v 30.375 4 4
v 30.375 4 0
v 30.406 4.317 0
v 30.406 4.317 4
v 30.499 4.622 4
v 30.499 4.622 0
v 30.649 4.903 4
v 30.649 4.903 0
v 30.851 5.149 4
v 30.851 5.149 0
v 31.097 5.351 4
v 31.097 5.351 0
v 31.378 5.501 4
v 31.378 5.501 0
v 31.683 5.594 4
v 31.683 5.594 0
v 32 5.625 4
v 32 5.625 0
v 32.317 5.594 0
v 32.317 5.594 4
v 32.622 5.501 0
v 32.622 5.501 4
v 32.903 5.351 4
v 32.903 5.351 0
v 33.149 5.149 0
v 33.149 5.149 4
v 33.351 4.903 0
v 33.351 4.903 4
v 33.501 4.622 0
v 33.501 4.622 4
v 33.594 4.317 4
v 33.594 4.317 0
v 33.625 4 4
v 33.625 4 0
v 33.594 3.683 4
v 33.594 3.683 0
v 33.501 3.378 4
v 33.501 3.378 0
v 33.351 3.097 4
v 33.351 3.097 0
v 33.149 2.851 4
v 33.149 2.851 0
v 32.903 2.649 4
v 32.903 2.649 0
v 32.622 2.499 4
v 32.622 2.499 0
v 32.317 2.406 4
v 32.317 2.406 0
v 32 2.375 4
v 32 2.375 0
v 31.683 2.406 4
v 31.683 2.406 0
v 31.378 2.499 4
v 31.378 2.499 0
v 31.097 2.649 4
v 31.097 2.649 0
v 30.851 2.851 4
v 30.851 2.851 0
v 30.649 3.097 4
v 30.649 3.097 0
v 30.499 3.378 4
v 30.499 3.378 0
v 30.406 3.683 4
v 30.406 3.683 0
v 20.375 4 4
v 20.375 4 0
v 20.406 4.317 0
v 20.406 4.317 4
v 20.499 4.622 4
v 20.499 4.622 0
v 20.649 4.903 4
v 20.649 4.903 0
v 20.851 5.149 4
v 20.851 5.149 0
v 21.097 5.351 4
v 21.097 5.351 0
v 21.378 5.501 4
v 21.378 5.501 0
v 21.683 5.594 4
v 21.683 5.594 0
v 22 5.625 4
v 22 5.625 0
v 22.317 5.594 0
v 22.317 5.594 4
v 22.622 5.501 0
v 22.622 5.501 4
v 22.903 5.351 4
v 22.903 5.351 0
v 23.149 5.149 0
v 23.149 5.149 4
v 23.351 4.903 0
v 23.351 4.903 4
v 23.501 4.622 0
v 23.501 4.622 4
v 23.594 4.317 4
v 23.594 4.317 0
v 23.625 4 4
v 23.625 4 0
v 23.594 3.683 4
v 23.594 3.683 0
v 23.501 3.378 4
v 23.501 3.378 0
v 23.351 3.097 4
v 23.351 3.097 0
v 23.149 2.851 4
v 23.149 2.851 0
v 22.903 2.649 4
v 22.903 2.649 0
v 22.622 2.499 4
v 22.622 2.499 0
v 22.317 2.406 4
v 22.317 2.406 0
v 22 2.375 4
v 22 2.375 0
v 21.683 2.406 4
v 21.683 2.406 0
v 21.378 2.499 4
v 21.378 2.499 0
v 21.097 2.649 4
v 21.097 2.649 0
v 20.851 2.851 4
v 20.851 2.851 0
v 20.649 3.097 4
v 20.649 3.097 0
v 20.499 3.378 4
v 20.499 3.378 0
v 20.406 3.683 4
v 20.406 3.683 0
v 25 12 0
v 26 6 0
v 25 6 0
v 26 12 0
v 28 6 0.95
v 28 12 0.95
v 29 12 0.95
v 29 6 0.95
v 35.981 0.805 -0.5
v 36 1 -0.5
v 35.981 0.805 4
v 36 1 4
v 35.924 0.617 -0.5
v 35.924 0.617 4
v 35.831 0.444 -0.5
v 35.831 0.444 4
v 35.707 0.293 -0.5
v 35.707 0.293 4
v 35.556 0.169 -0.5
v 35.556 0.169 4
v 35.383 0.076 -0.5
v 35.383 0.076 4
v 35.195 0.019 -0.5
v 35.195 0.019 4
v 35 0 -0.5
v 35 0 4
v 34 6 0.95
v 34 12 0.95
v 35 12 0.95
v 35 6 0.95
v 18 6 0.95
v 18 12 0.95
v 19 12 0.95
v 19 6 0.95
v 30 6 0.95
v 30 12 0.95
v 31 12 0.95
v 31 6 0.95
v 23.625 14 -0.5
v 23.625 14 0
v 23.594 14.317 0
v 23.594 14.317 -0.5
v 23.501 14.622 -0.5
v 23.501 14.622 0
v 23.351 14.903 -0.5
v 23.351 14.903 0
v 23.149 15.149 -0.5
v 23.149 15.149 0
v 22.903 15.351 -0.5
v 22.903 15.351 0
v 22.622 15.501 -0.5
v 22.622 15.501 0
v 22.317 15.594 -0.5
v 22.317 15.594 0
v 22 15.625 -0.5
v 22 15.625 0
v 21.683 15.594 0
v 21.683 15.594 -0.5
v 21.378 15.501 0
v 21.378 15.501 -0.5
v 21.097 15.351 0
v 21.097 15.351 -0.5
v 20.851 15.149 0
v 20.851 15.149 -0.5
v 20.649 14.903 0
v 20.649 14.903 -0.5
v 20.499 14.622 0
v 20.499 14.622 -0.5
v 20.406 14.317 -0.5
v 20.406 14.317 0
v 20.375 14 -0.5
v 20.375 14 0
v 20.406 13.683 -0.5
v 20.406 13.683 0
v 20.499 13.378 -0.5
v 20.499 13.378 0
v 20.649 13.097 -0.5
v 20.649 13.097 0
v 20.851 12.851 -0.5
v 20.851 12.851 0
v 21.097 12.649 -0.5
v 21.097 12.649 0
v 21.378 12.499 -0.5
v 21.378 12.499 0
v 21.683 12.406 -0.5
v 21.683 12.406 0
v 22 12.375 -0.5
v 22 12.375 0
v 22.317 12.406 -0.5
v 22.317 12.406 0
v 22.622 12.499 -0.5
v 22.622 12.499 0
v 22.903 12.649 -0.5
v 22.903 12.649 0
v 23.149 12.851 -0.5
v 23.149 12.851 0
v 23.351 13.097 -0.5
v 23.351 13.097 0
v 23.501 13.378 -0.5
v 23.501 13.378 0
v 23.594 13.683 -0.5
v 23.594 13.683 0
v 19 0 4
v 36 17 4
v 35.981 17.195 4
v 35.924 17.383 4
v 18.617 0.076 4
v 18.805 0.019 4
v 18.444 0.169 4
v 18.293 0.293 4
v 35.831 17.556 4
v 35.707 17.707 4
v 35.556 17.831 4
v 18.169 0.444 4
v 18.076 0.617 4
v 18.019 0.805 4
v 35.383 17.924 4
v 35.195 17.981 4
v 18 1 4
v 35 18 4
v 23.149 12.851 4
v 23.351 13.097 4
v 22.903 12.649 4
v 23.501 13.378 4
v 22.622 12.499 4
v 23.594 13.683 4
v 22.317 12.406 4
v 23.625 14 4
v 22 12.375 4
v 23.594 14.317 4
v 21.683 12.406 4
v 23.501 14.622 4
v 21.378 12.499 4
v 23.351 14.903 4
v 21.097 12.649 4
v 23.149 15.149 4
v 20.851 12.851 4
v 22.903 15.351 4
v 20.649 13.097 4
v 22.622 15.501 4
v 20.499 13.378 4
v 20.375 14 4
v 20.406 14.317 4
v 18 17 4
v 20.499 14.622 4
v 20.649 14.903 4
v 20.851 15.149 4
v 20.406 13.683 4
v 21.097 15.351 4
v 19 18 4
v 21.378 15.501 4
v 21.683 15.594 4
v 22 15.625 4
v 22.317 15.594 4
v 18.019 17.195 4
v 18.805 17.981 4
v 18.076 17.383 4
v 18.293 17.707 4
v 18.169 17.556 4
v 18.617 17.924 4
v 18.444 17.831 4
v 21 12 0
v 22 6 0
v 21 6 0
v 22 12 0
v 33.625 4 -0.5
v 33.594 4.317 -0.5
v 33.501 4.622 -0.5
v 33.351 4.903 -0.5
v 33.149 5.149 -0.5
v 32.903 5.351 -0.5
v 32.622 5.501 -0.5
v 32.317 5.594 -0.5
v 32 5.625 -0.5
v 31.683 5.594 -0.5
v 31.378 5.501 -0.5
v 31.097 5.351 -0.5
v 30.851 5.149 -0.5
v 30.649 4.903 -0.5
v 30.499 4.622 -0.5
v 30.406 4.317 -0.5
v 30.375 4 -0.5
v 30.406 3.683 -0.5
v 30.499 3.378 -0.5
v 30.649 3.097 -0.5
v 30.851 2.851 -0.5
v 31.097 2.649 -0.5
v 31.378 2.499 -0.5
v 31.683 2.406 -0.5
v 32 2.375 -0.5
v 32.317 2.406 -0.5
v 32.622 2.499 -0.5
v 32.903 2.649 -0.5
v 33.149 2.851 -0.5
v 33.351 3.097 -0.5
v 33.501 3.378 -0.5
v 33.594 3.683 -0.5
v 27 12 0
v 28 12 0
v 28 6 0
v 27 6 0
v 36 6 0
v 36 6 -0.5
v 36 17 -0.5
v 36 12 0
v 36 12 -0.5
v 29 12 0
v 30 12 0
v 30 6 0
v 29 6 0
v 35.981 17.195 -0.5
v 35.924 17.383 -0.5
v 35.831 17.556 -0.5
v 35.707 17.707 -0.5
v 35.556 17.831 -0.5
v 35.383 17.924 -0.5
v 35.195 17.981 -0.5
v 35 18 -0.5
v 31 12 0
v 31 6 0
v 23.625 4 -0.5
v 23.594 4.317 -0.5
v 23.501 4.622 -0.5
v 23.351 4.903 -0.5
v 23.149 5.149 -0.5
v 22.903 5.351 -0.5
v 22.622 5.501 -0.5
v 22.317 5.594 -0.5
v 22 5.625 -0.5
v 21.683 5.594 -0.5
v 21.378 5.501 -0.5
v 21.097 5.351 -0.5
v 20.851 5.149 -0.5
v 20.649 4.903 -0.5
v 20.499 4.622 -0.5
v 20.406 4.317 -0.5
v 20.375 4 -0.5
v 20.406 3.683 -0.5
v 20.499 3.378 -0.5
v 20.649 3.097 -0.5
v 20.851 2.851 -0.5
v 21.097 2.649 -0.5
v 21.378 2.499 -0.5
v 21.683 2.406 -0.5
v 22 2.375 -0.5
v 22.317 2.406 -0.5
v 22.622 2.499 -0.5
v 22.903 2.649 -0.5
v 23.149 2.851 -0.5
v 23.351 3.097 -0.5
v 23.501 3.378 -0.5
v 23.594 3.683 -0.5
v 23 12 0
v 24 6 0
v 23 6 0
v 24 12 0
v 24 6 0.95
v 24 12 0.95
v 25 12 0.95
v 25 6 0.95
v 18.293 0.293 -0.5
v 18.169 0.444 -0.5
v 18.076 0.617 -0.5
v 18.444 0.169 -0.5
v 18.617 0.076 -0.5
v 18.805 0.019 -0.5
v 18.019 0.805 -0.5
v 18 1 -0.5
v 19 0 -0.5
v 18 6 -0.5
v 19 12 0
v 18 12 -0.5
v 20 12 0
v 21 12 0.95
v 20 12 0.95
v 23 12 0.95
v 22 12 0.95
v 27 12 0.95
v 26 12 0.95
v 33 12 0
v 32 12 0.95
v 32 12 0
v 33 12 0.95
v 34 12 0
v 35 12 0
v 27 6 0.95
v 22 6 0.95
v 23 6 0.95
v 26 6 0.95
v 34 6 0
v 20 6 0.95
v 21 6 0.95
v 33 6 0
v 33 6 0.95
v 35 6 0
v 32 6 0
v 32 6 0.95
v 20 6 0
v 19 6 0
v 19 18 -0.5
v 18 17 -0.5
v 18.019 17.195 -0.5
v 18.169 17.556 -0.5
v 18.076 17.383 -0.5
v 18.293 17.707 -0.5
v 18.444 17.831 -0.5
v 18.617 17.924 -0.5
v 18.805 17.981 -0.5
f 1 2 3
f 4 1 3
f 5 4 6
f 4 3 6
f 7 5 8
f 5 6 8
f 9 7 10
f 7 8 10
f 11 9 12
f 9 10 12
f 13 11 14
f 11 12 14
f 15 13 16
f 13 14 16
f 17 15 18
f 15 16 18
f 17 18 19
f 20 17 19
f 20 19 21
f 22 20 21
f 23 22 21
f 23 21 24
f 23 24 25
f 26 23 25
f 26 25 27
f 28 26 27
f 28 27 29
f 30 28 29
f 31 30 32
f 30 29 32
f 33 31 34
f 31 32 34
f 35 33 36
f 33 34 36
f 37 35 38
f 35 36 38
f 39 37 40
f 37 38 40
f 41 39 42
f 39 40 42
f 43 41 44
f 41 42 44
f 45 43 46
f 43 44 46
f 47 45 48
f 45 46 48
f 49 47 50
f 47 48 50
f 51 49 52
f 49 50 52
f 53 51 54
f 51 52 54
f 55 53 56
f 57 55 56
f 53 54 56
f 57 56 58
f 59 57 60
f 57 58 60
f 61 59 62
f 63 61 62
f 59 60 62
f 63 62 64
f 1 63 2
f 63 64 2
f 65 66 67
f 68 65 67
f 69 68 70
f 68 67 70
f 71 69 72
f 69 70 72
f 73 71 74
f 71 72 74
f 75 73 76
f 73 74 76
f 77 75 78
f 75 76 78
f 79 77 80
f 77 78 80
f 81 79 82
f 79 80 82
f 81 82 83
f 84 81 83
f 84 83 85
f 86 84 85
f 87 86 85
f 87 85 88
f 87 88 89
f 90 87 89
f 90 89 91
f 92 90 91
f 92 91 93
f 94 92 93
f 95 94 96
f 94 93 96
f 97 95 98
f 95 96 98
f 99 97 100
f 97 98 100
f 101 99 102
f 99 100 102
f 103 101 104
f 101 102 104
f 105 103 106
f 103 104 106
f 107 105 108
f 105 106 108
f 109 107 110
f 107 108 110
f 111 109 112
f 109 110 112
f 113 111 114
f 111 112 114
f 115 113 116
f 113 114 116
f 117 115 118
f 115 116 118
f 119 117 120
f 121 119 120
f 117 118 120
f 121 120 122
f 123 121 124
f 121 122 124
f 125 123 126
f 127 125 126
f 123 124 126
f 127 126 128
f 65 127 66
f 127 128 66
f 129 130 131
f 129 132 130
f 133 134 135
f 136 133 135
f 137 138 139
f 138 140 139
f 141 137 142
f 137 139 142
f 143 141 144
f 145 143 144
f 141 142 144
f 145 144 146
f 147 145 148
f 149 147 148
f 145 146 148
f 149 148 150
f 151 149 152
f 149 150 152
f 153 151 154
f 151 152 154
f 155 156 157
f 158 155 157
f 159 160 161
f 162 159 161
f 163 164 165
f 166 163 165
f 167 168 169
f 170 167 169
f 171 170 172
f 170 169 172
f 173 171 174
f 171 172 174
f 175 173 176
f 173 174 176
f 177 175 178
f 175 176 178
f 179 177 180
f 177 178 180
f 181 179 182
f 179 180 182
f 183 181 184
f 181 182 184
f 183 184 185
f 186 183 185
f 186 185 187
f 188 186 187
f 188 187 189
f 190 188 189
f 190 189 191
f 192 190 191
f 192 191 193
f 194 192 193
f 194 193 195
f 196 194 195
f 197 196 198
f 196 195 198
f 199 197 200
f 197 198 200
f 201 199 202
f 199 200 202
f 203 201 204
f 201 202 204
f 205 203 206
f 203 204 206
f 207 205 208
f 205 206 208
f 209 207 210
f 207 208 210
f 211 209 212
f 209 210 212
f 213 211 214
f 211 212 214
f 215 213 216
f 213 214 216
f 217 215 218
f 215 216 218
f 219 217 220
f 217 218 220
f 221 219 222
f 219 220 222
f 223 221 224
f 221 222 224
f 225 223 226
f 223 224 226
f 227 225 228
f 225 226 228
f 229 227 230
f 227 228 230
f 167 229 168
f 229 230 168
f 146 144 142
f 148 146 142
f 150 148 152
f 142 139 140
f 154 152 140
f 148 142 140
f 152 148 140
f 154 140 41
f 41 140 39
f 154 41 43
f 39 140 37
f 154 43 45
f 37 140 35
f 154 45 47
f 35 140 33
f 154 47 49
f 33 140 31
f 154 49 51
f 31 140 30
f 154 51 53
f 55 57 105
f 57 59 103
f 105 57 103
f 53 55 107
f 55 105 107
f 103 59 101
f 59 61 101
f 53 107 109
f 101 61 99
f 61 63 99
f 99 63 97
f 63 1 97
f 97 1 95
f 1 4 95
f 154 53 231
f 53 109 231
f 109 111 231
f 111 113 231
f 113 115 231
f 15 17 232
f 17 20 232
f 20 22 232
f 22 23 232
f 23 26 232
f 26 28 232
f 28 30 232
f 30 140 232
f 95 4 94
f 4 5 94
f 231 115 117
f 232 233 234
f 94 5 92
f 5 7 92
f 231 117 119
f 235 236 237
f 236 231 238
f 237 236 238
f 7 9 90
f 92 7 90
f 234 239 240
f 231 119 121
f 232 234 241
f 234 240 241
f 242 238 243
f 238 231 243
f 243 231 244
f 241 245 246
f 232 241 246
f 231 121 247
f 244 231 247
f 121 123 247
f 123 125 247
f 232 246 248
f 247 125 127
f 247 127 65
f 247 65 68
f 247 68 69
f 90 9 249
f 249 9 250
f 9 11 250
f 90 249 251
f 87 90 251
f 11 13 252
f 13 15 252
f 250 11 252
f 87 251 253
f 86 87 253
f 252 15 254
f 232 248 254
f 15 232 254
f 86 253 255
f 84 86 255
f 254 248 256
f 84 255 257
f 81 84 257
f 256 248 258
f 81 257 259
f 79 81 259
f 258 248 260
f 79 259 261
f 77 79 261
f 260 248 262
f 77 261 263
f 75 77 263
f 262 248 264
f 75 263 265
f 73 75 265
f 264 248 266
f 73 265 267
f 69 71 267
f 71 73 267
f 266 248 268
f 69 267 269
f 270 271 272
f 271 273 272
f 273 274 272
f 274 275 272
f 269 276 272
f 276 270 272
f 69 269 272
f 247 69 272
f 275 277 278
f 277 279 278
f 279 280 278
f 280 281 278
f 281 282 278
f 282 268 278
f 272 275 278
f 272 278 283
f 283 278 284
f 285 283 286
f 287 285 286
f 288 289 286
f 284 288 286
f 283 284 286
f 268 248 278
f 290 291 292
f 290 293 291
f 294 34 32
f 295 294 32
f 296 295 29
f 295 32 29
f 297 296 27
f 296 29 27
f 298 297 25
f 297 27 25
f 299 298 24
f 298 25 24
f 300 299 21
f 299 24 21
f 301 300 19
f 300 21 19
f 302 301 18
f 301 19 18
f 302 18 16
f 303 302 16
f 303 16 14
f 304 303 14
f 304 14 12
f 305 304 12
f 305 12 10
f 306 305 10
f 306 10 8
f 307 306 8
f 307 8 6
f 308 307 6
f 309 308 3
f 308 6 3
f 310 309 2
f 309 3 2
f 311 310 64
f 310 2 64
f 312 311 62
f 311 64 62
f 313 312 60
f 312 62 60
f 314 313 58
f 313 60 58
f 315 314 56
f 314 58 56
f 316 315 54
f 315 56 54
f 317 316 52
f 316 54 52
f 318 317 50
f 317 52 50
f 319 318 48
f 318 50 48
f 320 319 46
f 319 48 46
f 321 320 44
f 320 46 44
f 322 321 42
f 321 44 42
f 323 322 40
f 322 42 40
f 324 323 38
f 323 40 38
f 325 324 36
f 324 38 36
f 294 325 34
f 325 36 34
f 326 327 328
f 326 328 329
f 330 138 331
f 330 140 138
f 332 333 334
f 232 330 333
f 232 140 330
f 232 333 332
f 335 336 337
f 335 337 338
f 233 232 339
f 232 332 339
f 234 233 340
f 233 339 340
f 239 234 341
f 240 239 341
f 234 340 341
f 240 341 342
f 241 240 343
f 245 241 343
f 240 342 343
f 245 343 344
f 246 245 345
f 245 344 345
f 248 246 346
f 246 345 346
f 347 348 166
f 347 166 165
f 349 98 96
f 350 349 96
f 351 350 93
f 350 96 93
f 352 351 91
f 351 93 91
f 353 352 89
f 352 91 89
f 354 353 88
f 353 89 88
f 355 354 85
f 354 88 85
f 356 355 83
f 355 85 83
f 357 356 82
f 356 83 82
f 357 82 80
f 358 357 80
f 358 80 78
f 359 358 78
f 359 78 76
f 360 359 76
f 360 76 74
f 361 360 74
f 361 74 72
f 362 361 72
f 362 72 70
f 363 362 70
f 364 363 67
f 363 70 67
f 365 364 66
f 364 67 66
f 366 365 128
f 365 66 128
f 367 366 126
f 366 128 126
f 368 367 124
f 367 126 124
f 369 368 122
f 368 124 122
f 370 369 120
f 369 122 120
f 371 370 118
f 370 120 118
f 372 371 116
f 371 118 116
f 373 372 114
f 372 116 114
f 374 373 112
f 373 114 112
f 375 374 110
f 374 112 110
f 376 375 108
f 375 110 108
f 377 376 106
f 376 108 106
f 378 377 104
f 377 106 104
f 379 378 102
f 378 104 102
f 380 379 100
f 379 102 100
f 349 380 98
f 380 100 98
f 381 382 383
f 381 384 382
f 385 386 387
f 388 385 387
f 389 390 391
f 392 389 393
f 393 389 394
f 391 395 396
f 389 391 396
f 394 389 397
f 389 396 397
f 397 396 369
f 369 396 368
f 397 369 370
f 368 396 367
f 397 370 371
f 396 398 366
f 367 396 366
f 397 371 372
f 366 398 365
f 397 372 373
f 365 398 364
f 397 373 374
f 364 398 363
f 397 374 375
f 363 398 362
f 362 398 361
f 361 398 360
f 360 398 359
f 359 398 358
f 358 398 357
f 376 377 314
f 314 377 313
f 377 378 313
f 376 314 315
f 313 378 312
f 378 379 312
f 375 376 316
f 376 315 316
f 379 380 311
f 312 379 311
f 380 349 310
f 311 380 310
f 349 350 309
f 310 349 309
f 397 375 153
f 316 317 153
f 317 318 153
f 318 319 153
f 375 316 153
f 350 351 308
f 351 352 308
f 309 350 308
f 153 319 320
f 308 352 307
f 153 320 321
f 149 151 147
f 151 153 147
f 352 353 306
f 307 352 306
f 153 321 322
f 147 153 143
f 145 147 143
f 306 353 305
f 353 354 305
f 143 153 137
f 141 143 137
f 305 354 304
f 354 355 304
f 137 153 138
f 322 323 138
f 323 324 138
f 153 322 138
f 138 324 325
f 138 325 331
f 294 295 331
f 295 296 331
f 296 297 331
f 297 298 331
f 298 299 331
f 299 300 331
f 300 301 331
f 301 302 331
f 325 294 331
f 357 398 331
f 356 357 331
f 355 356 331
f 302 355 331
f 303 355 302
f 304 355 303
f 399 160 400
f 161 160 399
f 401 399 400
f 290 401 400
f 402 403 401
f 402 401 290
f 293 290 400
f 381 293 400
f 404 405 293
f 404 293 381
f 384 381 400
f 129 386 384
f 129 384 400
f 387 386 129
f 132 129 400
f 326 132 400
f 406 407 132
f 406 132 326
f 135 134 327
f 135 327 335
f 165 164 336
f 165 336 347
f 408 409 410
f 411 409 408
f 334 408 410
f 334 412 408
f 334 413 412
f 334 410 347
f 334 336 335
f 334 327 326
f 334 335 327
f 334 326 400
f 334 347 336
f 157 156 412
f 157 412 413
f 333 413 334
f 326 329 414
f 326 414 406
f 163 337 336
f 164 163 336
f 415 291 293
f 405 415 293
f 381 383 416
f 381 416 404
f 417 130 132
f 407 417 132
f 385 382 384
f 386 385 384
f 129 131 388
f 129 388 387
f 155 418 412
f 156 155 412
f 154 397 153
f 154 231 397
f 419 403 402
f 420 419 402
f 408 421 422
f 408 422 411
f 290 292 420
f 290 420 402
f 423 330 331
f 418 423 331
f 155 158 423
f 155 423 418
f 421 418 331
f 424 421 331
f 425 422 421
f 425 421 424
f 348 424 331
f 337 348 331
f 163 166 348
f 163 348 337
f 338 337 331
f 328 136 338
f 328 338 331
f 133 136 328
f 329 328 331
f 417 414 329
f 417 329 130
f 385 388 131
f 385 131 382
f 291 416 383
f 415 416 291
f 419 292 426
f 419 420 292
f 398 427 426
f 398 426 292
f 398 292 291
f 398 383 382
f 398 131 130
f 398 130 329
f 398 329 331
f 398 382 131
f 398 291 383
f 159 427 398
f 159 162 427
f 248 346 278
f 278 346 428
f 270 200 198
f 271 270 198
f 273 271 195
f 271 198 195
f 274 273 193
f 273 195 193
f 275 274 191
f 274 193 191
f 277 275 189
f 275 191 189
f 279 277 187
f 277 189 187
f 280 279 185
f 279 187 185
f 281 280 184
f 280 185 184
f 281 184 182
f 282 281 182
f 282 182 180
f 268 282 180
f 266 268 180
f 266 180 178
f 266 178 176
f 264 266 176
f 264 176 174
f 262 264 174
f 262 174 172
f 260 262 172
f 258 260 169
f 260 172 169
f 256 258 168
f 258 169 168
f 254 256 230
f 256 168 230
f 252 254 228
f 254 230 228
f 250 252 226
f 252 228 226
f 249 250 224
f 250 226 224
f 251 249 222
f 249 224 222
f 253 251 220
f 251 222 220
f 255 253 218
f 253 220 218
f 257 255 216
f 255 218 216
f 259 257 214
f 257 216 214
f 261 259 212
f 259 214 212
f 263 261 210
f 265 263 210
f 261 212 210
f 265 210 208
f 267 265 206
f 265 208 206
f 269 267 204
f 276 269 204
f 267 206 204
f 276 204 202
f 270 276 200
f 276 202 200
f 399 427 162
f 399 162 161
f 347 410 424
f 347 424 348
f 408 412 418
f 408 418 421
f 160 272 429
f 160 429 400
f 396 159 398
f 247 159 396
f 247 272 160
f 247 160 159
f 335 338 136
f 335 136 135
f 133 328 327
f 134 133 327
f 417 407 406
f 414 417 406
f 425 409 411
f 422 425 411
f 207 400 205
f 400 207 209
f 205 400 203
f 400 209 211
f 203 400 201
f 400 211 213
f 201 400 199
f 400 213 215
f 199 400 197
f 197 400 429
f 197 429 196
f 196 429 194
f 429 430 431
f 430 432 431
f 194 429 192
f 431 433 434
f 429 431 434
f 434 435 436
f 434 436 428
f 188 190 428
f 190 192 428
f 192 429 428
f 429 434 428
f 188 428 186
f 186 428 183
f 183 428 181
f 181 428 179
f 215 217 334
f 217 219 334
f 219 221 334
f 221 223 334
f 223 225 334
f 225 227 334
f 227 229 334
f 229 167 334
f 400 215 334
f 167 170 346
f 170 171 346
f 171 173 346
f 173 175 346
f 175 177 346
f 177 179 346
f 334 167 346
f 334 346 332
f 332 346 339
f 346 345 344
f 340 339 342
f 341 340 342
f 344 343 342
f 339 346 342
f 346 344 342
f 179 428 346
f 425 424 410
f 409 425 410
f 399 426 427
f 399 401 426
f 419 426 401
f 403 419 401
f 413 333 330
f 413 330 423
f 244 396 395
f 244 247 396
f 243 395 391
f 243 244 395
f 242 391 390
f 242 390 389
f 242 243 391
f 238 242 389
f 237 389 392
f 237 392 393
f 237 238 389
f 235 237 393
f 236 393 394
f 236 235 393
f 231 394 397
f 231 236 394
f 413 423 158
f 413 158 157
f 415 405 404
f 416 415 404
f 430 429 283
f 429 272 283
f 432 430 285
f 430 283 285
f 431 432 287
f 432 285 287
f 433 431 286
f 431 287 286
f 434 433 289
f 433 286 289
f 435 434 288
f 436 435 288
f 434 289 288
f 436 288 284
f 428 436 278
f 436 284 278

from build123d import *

# Parameters (mm, degrees)
SKETCH1_W           = 18
SKETCH1_H           = 18
SKETCH1_R           = 1.625
BOSS_EXTRUDE1_DEPTH = 4
SKETCH2_W           = 1
SKETCH2_H           = 6
CUT_EXTRUDE1_DEPTH  = 0.95
SKETCH3_R           = 1.625
BOSS_EXTRUDE2_DEPTH = 0.5
FILLET1_R           = 1


with BuildPart() as part:
    # Sketch1 → Boss-Extrude1 (new body)
    with BuildSketch(Plane.XY):
        with Locations((9, 9)):
            Rectangle(SKETCH1_W, SKETCH1_H)
        with Locations((4, 4)):
            Circle(SKETCH1_R, mode=Mode.SUBTRACT)
        with Locations((14, 4)):
            Circle(SKETCH1_R, mode=Mode.SUBTRACT)
        with Locations((14, 14)):
            Circle(SKETCH1_R, mode=Mode.SUBTRACT)
    extrude(amount=BOSS_EXTRUDE1_DEPTH)

    # Sketch2 → Cut-Extrude1 (cut)
    with BuildSketch(Plane(origin=(0, 0, 0), x_dir=(-1, 0, 0), z_dir=(0, 0, -1))):
        with Locations((-17.5, 9)):
            Rectangle(SKETCH2_W, SKETCH2_H)
        with Locations((-15.5, 9)):
            Rectangle(SKETCH2_W, SKETCH2_H)
        with Locations((-13.5, 9)):
            Rectangle(SKETCH2_W, SKETCH2_H)
        with Locations((-11.5, 9)):
            Rectangle(SKETCH2_W, SKETCH2_H)
        with Locations((-9.5, 9)):
            Rectangle(SKETCH2_W, SKETCH2_H)
        with Locations((-7.5, 9)):
            Rectangle(SKETCH2_W, SKETCH2_H)
        with Locations((-5.5, 9)):
            Rectangle(SKETCH2_W, SKETCH2_H)
        with Locations((-3.5, 9)):
            Rectangle(SKETCH2_W, SKETCH2_H)
        with Locations((-1.5, 9)):
            Rectangle(SKETCH2_W, SKETCH2_H)
    extrude(amount=-CUT_EXTRUDE1_DEPTH, mode=Mode.SUBTRACT)

    # Sketch3 → Boss-Extrude2 (add)
    with BuildSketch(Plane(origin=(0, 0, 0), x_dir=(-1, 0, 0), z_dir=(0, 0, -1))):
        Polygon((0, 0), (0, 6), (-1, 6), (-2, 6), (-3, 6), (-4, 6), (-5, 6), (-6, 6), (-7, 6), (-8, 6), (-9, 6), (-10, 6), (-11, 6), (-12, 6), (-13, 6), (-14, 6), (-15, 6), (-16, 6), (-17, 6), (-18, 6), (-18, 0), align=None)
        with Locations((-14, 4)):
            Circle(SKETCH3_R, mode=Mode.SUBTRACT)
        with Locations((-4, 4)):
            Circle(SKETCH3_R, mode=Mode.SUBTRACT)
        Polygon((0, 18), (-18, 18), (-18, 12), (-17, 12), (-16, 12), (-15, 12), (-14, 12), (-13, 12), (-12, 12), (-11, 12), (-10, 12), (-9, 12), (-8, 12), (-7, 12), (-6, 12), (-5, 12), (-4, 12), (-3, 12), (-2, 12), (-1, 12), (0, 12), align=None)
        with Locations((-14, 14)):
            Circle(SKETCH3_R, mode=Mode.SUBTRACT)
    extrude(amount=BOSS_EXTRUDE2_DEPTH)

    # Fillet1
    fillet1_edges = [part.edges().sort_by_distance(p)[0] for p in [
        (0, 18, 1.75),
        (18, 18, 1.75),
        (18, 0, 1.75),
        (0, 0, 1.75),
    ]]
    fillet(fillet1_edges, radius=FILLET1_R)


with BuildPart() as body_2:
    # Mirror1: mirrored copy
    add(part.part.mirror(Plane(origin=(18, 0, 4), x_dir=(0, 0, 1), z_dir=(-1, 0, 0))))


solid = body_2.part
